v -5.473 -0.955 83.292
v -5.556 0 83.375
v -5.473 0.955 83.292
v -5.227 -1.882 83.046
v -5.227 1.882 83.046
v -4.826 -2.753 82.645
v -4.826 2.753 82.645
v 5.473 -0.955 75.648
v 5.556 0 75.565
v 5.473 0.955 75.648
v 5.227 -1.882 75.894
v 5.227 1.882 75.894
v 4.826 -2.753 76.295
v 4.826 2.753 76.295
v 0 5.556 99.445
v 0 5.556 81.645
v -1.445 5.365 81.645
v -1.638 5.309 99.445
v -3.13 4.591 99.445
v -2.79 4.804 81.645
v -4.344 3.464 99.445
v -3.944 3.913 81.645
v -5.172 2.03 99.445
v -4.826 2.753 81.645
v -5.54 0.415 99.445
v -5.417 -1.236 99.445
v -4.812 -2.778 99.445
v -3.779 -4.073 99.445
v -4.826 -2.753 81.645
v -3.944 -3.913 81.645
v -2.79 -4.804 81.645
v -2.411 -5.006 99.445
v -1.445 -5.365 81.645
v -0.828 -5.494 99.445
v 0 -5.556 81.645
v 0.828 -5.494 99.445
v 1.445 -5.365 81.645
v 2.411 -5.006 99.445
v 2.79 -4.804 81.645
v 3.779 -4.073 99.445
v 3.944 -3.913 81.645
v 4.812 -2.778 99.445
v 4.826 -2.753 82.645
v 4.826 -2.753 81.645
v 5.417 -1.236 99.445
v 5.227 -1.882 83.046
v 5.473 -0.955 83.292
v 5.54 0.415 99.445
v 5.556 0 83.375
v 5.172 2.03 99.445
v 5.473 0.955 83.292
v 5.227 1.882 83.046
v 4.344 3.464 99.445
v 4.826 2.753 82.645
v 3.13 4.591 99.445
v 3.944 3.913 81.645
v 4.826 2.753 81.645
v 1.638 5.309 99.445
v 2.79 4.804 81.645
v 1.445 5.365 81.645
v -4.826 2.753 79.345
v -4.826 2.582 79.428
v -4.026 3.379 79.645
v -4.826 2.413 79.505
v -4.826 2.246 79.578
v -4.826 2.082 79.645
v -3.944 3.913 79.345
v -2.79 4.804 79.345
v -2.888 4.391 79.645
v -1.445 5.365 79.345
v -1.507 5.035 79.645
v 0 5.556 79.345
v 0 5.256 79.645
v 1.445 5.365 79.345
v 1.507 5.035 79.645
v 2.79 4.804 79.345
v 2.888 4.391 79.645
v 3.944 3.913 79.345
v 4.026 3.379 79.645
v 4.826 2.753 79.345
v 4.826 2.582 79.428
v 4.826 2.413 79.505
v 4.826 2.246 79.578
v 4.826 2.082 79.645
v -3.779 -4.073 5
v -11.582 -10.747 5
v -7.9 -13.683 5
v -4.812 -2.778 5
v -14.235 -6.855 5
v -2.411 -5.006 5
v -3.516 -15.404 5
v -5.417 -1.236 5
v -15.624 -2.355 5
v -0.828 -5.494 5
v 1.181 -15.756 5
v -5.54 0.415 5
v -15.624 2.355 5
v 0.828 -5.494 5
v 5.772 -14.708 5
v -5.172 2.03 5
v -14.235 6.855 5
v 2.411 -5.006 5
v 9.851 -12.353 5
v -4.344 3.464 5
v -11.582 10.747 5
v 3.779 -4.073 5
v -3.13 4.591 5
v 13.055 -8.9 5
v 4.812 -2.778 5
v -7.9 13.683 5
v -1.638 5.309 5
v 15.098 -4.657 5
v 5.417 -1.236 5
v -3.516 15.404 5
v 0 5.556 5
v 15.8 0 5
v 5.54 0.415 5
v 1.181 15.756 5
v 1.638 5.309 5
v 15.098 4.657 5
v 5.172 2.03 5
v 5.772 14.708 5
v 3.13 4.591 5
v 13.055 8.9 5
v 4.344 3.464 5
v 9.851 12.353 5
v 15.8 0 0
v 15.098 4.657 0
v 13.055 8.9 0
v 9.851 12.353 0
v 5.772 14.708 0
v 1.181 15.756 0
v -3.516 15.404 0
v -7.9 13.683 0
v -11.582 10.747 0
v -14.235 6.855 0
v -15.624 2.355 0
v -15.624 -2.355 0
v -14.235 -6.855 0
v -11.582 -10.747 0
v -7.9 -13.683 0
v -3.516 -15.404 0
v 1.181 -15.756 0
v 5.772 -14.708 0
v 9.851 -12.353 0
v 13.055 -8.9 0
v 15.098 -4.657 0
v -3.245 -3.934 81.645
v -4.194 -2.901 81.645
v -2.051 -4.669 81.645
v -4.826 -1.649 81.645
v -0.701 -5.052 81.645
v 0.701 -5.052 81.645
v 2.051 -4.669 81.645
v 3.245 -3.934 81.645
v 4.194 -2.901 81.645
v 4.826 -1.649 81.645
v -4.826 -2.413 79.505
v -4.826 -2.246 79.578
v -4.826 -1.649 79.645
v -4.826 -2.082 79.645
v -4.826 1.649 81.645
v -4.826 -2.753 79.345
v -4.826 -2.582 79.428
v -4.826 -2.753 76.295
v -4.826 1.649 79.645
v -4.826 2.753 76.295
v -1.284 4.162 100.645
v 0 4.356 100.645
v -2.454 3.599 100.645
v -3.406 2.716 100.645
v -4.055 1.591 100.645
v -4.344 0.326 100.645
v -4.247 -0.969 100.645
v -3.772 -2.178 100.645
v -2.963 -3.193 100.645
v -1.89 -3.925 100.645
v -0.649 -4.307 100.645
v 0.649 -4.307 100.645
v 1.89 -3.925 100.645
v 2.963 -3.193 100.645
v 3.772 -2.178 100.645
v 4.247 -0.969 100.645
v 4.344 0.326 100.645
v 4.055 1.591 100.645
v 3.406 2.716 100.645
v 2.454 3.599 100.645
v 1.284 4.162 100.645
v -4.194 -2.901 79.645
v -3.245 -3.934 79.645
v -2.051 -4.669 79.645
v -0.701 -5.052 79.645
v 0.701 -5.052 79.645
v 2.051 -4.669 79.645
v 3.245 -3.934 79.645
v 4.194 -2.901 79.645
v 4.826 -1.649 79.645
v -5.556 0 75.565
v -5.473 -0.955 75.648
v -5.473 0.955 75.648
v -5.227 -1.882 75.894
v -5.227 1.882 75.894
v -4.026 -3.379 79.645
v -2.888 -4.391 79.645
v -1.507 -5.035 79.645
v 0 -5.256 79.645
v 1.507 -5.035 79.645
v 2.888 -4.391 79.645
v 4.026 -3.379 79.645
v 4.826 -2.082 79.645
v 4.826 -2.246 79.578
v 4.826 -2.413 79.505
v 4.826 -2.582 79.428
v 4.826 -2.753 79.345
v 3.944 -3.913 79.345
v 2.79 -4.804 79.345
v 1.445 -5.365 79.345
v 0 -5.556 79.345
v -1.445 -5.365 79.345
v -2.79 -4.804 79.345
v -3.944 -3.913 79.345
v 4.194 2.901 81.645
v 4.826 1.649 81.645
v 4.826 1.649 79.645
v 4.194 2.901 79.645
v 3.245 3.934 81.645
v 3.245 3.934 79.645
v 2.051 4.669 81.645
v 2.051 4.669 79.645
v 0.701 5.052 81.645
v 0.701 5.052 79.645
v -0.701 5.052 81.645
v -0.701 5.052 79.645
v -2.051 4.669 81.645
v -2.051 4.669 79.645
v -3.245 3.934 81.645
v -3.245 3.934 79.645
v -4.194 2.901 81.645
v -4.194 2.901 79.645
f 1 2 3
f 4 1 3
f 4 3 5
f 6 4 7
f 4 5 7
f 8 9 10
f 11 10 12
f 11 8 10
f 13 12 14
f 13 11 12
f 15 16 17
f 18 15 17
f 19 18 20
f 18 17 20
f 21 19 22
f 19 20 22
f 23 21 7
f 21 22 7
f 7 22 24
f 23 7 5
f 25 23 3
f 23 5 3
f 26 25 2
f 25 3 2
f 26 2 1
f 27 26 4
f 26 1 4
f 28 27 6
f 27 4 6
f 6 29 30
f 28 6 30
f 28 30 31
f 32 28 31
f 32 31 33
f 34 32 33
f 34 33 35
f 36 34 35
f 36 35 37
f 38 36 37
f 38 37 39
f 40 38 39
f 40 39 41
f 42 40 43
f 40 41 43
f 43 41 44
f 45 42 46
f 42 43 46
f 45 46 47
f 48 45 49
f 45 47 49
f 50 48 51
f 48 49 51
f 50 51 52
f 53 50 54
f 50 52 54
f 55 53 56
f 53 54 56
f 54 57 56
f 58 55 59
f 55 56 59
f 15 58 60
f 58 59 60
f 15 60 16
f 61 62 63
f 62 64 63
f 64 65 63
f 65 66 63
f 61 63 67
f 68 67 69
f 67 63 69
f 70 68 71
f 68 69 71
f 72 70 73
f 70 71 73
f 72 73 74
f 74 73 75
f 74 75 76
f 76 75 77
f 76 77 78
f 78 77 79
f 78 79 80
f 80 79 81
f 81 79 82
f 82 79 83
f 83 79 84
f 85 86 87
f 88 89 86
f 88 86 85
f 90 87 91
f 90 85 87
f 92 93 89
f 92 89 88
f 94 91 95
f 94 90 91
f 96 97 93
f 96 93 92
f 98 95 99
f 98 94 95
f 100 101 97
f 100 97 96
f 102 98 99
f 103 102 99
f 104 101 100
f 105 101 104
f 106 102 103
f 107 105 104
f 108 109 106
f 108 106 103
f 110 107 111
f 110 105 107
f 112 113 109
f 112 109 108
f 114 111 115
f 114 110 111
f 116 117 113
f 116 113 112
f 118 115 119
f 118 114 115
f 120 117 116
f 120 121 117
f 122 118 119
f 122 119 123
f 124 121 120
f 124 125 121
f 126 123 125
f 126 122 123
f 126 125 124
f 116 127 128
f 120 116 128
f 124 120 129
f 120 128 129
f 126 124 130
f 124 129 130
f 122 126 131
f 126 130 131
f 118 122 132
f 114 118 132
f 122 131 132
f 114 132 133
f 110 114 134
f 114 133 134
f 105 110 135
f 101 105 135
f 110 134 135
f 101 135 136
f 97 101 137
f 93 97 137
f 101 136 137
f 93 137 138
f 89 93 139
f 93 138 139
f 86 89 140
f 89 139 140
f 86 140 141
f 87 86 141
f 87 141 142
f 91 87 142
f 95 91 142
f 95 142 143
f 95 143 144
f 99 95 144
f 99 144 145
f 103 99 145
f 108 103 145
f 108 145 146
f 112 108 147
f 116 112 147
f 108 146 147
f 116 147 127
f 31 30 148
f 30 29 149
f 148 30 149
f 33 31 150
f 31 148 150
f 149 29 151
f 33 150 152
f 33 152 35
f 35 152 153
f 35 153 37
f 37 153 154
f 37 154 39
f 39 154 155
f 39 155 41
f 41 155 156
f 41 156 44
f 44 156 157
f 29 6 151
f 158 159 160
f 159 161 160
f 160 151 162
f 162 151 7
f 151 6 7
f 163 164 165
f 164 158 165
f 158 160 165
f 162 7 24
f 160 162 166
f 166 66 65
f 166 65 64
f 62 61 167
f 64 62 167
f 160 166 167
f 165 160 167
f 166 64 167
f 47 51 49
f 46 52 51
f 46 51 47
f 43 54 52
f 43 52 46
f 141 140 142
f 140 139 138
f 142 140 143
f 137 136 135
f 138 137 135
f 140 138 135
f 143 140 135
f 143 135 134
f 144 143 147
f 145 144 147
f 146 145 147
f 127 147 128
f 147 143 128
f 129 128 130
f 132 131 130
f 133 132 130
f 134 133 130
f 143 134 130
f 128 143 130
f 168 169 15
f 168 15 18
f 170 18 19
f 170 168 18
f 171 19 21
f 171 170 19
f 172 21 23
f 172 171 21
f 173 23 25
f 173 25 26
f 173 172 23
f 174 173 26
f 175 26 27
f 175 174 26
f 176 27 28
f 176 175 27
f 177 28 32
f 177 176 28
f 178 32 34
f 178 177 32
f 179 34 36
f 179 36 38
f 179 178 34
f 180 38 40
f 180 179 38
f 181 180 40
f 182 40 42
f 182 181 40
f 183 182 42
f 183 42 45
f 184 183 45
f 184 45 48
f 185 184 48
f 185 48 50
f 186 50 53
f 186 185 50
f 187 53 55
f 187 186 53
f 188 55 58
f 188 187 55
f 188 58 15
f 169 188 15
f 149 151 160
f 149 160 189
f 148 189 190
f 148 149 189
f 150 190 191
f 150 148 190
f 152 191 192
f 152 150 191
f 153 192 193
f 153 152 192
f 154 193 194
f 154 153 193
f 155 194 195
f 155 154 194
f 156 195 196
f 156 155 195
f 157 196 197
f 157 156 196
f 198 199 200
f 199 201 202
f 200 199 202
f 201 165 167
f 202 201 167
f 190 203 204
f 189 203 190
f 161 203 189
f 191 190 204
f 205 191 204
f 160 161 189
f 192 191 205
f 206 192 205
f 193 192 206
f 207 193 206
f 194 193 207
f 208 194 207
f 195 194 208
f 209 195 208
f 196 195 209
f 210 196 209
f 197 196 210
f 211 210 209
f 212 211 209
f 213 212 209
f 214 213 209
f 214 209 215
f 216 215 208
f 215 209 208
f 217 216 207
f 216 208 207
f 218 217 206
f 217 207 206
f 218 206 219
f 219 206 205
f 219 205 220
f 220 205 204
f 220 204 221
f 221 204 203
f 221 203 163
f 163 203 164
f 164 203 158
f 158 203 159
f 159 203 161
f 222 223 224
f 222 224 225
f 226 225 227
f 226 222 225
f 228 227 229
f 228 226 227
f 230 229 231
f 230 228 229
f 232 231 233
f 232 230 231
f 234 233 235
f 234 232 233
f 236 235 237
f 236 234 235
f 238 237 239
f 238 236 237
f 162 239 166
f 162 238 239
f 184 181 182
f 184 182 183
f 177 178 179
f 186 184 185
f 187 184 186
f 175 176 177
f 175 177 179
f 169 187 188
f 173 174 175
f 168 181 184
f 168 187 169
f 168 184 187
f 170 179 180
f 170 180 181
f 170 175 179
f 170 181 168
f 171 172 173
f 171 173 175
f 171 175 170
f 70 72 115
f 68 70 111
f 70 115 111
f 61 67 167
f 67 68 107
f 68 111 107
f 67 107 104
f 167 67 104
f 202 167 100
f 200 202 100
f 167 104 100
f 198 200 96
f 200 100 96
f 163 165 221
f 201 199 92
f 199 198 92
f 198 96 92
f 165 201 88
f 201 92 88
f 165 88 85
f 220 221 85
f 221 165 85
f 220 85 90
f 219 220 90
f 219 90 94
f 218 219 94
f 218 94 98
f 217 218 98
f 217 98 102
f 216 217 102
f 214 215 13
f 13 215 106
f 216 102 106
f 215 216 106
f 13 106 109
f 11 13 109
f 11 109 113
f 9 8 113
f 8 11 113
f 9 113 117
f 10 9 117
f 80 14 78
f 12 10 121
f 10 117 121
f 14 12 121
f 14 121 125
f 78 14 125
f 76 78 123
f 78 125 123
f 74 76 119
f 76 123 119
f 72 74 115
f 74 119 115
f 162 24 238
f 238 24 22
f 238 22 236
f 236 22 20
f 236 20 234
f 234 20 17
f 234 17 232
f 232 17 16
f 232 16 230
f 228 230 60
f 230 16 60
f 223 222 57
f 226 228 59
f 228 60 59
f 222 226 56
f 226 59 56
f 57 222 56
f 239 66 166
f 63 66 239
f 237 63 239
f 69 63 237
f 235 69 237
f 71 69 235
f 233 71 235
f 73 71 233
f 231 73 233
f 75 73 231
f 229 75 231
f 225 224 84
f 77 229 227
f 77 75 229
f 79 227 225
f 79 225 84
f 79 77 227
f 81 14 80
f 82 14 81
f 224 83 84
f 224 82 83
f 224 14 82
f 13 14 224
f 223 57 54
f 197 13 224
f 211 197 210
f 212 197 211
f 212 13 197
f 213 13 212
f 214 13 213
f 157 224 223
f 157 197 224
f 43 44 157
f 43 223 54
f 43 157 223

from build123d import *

# Parameters (mm, degrees)
SKETCH1_R                      = 5.556
EXTRUDE1_DEPTH                 = 100.645
THREADCHAMFER_SIZE             = 1.2
SKETCH3_OUTSIDE_W              = 33.484
SKETCH3_OUTSIDE_H              = 33.484
SKETCH3_OUTSIDE_R              = 5.1
CUT_EXTRUDE1_DEPTH             = 2
CHAMFER2_SIZE                  = 0.3
SKETCH4_R                      = 15.8
PISTON_DEPTH                   = 5
CUT_EXTRUDE2_REACH             = 105.096
CUT_EXTRUDE2_DIRECTION_2_REACH = 105.096


with BuildPart() as part:
    # Sketch1 → Extrude1 (new body)
    with BuildSketch(Plane.XY):
        with Locations(Location((0, 0, 0), (0, 0, 90))):
            Circle(SKETCH1_R)
    extrude(amount=EXTRUDE1_DEPTH)

    # ThreadChamfer
    threadchamfer_edges = [part.edges().sort_by_distance(p)[0] for p in [
        (0, -5.556, 100.645),
    ]]
    chamfer(threadchamfer_edges, length=THREADCHAMFER_SIZE)

    # Sketch3 outside → Cut-Extrude1 (cut)
    with BuildSketch(Plane.XY.offset(81.645)):
        Rectangle(SKETCH3_OUTSIDE_W, SKETCH3_OUTSIDE_H)
        Circle(SKETCH3_OUTSIDE_R, mode=Mode.SUBTRACT)
    extrude(amount=-CUT_EXTRUDE1_DEPTH, mode=Mode.SUBTRACT)

    # Chamfer2
    chamfer2_edges = [part.edges().sort_by_distance(p)[0] for p in [
        (0, -5.556, 79.645),
    ]]
    chamfer(chamfer2_edges, length=CHAMFER2_SIZE)

    # Sketch4 → Piston (add)
    with BuildSketch(Plane.XY):
        Circle(SKETCH4_R)
    extrude(amount=PISTON_DEPTH)

    # Sketch5 → Cut-Extrude2 (cut, up to next)
    with BuildSketch(Plane(origin=(0, 0, 0), x_dir=(1, 0, 0), z_dir=(0, 1, 0)), mode=Mode.PRIVATE) as cut_extrude2_sk1:
        Polygon((5.556, -75.565), (4.826, -76.295), (4.826, -82.645), (5.556, -83.375), align=None)
    cut_extrude2_tool1 = extrude(cut_extrude2_sk1.sketch, amount=-CUT_EXTRUDE2_REACH, mode=Mode.PRIVATE) & part.part
    # Sketch5 → Cut-Extrude2 (cut, up to next)
    with BuildSketch(Plane(origin=(0, 0, 0), x_dir=(1, 0, 0), z_dir=(0, 1, 0)), mode=Mode.PRIVATE) as cut_extrude2_sk2:
        Polygon((-5.556, -83.375), (-4.826, -82.645), (-4.826, -76.295), (-5.556, -75.565), align=None)
    cut_extrude2_tool2 = extrude(cut_extrude2_sk2.sketch, amount=-CUT_EXTRUDE2_REACH, mode=Mode.PRIVATE) & part.part
    add(cut_extrude2_tool1.solids().sort_by_distance((5.203545, 0, 79.47))[0], mode=Mode.SUBTRACT)
    add(cut_extrude2_tool2.solids().sort_by_distance((-5.203545, 0, 79.47))[0], mode=Mode.SUBTRACT)

    # Sketch5 → Cut-Extrude2 direction 2 (cut, up to next)
    with BuildSketch(Plane(origin=(0, 0, 0), x_dir=(1, 0, 0), z_dir=(0, 1, 0)), mode=Mode.PRIVATE) as cut_extrude2_direction_2_sk1:
        Polygon((5.556, -75.565), (4.826, -76.295), (4.826, -82.645), (5.556, -83.375), align=None)
    cut_extrude2_direction_2_tool1 = extrude(cut_extrude2_direction_2_sk1.sketch, amount=CUT_EXTRUDE2_DIRECTION_2_REACH, mode=Mode.PRIVATE) & part.part
    # Sketch5 → Cut-Extrude2 direction 2 (cut, up to next)
    with BuildSketch(Plane(origin=(0, 0, 0), x_dir=(1, 0, 0), z_dir=(0, 1, 0)), mode=Mode.PRIVATE) as cut_extrude2_direction_2_sk2:
        Polygon((-5.556, -83.375), (-4.826, -82.645), (-4.826, -76.295), (-5.556, -75.565), align=None)
    cut_extrude2_direction_2_tool2 = extrude(cut_extrude2_direction_2_sk2.sketch, amount=CUT_EXTRUDE2_DIRECTION_2_REACH, mode=Mode.PRIVATE) & part.part
    add(cut_extrude2_direction_2_tool1.solids().sort_by_distance((5.203545, 0, 79.47))[0], mode=Mode.SUBTRACT)
    add(cut_extrude2_direction_2_tool2.solids().sort_by_distance((-5.203545, 0, 79.47))[0], mode=Mode.SUBTRACT)


solid = part.part
